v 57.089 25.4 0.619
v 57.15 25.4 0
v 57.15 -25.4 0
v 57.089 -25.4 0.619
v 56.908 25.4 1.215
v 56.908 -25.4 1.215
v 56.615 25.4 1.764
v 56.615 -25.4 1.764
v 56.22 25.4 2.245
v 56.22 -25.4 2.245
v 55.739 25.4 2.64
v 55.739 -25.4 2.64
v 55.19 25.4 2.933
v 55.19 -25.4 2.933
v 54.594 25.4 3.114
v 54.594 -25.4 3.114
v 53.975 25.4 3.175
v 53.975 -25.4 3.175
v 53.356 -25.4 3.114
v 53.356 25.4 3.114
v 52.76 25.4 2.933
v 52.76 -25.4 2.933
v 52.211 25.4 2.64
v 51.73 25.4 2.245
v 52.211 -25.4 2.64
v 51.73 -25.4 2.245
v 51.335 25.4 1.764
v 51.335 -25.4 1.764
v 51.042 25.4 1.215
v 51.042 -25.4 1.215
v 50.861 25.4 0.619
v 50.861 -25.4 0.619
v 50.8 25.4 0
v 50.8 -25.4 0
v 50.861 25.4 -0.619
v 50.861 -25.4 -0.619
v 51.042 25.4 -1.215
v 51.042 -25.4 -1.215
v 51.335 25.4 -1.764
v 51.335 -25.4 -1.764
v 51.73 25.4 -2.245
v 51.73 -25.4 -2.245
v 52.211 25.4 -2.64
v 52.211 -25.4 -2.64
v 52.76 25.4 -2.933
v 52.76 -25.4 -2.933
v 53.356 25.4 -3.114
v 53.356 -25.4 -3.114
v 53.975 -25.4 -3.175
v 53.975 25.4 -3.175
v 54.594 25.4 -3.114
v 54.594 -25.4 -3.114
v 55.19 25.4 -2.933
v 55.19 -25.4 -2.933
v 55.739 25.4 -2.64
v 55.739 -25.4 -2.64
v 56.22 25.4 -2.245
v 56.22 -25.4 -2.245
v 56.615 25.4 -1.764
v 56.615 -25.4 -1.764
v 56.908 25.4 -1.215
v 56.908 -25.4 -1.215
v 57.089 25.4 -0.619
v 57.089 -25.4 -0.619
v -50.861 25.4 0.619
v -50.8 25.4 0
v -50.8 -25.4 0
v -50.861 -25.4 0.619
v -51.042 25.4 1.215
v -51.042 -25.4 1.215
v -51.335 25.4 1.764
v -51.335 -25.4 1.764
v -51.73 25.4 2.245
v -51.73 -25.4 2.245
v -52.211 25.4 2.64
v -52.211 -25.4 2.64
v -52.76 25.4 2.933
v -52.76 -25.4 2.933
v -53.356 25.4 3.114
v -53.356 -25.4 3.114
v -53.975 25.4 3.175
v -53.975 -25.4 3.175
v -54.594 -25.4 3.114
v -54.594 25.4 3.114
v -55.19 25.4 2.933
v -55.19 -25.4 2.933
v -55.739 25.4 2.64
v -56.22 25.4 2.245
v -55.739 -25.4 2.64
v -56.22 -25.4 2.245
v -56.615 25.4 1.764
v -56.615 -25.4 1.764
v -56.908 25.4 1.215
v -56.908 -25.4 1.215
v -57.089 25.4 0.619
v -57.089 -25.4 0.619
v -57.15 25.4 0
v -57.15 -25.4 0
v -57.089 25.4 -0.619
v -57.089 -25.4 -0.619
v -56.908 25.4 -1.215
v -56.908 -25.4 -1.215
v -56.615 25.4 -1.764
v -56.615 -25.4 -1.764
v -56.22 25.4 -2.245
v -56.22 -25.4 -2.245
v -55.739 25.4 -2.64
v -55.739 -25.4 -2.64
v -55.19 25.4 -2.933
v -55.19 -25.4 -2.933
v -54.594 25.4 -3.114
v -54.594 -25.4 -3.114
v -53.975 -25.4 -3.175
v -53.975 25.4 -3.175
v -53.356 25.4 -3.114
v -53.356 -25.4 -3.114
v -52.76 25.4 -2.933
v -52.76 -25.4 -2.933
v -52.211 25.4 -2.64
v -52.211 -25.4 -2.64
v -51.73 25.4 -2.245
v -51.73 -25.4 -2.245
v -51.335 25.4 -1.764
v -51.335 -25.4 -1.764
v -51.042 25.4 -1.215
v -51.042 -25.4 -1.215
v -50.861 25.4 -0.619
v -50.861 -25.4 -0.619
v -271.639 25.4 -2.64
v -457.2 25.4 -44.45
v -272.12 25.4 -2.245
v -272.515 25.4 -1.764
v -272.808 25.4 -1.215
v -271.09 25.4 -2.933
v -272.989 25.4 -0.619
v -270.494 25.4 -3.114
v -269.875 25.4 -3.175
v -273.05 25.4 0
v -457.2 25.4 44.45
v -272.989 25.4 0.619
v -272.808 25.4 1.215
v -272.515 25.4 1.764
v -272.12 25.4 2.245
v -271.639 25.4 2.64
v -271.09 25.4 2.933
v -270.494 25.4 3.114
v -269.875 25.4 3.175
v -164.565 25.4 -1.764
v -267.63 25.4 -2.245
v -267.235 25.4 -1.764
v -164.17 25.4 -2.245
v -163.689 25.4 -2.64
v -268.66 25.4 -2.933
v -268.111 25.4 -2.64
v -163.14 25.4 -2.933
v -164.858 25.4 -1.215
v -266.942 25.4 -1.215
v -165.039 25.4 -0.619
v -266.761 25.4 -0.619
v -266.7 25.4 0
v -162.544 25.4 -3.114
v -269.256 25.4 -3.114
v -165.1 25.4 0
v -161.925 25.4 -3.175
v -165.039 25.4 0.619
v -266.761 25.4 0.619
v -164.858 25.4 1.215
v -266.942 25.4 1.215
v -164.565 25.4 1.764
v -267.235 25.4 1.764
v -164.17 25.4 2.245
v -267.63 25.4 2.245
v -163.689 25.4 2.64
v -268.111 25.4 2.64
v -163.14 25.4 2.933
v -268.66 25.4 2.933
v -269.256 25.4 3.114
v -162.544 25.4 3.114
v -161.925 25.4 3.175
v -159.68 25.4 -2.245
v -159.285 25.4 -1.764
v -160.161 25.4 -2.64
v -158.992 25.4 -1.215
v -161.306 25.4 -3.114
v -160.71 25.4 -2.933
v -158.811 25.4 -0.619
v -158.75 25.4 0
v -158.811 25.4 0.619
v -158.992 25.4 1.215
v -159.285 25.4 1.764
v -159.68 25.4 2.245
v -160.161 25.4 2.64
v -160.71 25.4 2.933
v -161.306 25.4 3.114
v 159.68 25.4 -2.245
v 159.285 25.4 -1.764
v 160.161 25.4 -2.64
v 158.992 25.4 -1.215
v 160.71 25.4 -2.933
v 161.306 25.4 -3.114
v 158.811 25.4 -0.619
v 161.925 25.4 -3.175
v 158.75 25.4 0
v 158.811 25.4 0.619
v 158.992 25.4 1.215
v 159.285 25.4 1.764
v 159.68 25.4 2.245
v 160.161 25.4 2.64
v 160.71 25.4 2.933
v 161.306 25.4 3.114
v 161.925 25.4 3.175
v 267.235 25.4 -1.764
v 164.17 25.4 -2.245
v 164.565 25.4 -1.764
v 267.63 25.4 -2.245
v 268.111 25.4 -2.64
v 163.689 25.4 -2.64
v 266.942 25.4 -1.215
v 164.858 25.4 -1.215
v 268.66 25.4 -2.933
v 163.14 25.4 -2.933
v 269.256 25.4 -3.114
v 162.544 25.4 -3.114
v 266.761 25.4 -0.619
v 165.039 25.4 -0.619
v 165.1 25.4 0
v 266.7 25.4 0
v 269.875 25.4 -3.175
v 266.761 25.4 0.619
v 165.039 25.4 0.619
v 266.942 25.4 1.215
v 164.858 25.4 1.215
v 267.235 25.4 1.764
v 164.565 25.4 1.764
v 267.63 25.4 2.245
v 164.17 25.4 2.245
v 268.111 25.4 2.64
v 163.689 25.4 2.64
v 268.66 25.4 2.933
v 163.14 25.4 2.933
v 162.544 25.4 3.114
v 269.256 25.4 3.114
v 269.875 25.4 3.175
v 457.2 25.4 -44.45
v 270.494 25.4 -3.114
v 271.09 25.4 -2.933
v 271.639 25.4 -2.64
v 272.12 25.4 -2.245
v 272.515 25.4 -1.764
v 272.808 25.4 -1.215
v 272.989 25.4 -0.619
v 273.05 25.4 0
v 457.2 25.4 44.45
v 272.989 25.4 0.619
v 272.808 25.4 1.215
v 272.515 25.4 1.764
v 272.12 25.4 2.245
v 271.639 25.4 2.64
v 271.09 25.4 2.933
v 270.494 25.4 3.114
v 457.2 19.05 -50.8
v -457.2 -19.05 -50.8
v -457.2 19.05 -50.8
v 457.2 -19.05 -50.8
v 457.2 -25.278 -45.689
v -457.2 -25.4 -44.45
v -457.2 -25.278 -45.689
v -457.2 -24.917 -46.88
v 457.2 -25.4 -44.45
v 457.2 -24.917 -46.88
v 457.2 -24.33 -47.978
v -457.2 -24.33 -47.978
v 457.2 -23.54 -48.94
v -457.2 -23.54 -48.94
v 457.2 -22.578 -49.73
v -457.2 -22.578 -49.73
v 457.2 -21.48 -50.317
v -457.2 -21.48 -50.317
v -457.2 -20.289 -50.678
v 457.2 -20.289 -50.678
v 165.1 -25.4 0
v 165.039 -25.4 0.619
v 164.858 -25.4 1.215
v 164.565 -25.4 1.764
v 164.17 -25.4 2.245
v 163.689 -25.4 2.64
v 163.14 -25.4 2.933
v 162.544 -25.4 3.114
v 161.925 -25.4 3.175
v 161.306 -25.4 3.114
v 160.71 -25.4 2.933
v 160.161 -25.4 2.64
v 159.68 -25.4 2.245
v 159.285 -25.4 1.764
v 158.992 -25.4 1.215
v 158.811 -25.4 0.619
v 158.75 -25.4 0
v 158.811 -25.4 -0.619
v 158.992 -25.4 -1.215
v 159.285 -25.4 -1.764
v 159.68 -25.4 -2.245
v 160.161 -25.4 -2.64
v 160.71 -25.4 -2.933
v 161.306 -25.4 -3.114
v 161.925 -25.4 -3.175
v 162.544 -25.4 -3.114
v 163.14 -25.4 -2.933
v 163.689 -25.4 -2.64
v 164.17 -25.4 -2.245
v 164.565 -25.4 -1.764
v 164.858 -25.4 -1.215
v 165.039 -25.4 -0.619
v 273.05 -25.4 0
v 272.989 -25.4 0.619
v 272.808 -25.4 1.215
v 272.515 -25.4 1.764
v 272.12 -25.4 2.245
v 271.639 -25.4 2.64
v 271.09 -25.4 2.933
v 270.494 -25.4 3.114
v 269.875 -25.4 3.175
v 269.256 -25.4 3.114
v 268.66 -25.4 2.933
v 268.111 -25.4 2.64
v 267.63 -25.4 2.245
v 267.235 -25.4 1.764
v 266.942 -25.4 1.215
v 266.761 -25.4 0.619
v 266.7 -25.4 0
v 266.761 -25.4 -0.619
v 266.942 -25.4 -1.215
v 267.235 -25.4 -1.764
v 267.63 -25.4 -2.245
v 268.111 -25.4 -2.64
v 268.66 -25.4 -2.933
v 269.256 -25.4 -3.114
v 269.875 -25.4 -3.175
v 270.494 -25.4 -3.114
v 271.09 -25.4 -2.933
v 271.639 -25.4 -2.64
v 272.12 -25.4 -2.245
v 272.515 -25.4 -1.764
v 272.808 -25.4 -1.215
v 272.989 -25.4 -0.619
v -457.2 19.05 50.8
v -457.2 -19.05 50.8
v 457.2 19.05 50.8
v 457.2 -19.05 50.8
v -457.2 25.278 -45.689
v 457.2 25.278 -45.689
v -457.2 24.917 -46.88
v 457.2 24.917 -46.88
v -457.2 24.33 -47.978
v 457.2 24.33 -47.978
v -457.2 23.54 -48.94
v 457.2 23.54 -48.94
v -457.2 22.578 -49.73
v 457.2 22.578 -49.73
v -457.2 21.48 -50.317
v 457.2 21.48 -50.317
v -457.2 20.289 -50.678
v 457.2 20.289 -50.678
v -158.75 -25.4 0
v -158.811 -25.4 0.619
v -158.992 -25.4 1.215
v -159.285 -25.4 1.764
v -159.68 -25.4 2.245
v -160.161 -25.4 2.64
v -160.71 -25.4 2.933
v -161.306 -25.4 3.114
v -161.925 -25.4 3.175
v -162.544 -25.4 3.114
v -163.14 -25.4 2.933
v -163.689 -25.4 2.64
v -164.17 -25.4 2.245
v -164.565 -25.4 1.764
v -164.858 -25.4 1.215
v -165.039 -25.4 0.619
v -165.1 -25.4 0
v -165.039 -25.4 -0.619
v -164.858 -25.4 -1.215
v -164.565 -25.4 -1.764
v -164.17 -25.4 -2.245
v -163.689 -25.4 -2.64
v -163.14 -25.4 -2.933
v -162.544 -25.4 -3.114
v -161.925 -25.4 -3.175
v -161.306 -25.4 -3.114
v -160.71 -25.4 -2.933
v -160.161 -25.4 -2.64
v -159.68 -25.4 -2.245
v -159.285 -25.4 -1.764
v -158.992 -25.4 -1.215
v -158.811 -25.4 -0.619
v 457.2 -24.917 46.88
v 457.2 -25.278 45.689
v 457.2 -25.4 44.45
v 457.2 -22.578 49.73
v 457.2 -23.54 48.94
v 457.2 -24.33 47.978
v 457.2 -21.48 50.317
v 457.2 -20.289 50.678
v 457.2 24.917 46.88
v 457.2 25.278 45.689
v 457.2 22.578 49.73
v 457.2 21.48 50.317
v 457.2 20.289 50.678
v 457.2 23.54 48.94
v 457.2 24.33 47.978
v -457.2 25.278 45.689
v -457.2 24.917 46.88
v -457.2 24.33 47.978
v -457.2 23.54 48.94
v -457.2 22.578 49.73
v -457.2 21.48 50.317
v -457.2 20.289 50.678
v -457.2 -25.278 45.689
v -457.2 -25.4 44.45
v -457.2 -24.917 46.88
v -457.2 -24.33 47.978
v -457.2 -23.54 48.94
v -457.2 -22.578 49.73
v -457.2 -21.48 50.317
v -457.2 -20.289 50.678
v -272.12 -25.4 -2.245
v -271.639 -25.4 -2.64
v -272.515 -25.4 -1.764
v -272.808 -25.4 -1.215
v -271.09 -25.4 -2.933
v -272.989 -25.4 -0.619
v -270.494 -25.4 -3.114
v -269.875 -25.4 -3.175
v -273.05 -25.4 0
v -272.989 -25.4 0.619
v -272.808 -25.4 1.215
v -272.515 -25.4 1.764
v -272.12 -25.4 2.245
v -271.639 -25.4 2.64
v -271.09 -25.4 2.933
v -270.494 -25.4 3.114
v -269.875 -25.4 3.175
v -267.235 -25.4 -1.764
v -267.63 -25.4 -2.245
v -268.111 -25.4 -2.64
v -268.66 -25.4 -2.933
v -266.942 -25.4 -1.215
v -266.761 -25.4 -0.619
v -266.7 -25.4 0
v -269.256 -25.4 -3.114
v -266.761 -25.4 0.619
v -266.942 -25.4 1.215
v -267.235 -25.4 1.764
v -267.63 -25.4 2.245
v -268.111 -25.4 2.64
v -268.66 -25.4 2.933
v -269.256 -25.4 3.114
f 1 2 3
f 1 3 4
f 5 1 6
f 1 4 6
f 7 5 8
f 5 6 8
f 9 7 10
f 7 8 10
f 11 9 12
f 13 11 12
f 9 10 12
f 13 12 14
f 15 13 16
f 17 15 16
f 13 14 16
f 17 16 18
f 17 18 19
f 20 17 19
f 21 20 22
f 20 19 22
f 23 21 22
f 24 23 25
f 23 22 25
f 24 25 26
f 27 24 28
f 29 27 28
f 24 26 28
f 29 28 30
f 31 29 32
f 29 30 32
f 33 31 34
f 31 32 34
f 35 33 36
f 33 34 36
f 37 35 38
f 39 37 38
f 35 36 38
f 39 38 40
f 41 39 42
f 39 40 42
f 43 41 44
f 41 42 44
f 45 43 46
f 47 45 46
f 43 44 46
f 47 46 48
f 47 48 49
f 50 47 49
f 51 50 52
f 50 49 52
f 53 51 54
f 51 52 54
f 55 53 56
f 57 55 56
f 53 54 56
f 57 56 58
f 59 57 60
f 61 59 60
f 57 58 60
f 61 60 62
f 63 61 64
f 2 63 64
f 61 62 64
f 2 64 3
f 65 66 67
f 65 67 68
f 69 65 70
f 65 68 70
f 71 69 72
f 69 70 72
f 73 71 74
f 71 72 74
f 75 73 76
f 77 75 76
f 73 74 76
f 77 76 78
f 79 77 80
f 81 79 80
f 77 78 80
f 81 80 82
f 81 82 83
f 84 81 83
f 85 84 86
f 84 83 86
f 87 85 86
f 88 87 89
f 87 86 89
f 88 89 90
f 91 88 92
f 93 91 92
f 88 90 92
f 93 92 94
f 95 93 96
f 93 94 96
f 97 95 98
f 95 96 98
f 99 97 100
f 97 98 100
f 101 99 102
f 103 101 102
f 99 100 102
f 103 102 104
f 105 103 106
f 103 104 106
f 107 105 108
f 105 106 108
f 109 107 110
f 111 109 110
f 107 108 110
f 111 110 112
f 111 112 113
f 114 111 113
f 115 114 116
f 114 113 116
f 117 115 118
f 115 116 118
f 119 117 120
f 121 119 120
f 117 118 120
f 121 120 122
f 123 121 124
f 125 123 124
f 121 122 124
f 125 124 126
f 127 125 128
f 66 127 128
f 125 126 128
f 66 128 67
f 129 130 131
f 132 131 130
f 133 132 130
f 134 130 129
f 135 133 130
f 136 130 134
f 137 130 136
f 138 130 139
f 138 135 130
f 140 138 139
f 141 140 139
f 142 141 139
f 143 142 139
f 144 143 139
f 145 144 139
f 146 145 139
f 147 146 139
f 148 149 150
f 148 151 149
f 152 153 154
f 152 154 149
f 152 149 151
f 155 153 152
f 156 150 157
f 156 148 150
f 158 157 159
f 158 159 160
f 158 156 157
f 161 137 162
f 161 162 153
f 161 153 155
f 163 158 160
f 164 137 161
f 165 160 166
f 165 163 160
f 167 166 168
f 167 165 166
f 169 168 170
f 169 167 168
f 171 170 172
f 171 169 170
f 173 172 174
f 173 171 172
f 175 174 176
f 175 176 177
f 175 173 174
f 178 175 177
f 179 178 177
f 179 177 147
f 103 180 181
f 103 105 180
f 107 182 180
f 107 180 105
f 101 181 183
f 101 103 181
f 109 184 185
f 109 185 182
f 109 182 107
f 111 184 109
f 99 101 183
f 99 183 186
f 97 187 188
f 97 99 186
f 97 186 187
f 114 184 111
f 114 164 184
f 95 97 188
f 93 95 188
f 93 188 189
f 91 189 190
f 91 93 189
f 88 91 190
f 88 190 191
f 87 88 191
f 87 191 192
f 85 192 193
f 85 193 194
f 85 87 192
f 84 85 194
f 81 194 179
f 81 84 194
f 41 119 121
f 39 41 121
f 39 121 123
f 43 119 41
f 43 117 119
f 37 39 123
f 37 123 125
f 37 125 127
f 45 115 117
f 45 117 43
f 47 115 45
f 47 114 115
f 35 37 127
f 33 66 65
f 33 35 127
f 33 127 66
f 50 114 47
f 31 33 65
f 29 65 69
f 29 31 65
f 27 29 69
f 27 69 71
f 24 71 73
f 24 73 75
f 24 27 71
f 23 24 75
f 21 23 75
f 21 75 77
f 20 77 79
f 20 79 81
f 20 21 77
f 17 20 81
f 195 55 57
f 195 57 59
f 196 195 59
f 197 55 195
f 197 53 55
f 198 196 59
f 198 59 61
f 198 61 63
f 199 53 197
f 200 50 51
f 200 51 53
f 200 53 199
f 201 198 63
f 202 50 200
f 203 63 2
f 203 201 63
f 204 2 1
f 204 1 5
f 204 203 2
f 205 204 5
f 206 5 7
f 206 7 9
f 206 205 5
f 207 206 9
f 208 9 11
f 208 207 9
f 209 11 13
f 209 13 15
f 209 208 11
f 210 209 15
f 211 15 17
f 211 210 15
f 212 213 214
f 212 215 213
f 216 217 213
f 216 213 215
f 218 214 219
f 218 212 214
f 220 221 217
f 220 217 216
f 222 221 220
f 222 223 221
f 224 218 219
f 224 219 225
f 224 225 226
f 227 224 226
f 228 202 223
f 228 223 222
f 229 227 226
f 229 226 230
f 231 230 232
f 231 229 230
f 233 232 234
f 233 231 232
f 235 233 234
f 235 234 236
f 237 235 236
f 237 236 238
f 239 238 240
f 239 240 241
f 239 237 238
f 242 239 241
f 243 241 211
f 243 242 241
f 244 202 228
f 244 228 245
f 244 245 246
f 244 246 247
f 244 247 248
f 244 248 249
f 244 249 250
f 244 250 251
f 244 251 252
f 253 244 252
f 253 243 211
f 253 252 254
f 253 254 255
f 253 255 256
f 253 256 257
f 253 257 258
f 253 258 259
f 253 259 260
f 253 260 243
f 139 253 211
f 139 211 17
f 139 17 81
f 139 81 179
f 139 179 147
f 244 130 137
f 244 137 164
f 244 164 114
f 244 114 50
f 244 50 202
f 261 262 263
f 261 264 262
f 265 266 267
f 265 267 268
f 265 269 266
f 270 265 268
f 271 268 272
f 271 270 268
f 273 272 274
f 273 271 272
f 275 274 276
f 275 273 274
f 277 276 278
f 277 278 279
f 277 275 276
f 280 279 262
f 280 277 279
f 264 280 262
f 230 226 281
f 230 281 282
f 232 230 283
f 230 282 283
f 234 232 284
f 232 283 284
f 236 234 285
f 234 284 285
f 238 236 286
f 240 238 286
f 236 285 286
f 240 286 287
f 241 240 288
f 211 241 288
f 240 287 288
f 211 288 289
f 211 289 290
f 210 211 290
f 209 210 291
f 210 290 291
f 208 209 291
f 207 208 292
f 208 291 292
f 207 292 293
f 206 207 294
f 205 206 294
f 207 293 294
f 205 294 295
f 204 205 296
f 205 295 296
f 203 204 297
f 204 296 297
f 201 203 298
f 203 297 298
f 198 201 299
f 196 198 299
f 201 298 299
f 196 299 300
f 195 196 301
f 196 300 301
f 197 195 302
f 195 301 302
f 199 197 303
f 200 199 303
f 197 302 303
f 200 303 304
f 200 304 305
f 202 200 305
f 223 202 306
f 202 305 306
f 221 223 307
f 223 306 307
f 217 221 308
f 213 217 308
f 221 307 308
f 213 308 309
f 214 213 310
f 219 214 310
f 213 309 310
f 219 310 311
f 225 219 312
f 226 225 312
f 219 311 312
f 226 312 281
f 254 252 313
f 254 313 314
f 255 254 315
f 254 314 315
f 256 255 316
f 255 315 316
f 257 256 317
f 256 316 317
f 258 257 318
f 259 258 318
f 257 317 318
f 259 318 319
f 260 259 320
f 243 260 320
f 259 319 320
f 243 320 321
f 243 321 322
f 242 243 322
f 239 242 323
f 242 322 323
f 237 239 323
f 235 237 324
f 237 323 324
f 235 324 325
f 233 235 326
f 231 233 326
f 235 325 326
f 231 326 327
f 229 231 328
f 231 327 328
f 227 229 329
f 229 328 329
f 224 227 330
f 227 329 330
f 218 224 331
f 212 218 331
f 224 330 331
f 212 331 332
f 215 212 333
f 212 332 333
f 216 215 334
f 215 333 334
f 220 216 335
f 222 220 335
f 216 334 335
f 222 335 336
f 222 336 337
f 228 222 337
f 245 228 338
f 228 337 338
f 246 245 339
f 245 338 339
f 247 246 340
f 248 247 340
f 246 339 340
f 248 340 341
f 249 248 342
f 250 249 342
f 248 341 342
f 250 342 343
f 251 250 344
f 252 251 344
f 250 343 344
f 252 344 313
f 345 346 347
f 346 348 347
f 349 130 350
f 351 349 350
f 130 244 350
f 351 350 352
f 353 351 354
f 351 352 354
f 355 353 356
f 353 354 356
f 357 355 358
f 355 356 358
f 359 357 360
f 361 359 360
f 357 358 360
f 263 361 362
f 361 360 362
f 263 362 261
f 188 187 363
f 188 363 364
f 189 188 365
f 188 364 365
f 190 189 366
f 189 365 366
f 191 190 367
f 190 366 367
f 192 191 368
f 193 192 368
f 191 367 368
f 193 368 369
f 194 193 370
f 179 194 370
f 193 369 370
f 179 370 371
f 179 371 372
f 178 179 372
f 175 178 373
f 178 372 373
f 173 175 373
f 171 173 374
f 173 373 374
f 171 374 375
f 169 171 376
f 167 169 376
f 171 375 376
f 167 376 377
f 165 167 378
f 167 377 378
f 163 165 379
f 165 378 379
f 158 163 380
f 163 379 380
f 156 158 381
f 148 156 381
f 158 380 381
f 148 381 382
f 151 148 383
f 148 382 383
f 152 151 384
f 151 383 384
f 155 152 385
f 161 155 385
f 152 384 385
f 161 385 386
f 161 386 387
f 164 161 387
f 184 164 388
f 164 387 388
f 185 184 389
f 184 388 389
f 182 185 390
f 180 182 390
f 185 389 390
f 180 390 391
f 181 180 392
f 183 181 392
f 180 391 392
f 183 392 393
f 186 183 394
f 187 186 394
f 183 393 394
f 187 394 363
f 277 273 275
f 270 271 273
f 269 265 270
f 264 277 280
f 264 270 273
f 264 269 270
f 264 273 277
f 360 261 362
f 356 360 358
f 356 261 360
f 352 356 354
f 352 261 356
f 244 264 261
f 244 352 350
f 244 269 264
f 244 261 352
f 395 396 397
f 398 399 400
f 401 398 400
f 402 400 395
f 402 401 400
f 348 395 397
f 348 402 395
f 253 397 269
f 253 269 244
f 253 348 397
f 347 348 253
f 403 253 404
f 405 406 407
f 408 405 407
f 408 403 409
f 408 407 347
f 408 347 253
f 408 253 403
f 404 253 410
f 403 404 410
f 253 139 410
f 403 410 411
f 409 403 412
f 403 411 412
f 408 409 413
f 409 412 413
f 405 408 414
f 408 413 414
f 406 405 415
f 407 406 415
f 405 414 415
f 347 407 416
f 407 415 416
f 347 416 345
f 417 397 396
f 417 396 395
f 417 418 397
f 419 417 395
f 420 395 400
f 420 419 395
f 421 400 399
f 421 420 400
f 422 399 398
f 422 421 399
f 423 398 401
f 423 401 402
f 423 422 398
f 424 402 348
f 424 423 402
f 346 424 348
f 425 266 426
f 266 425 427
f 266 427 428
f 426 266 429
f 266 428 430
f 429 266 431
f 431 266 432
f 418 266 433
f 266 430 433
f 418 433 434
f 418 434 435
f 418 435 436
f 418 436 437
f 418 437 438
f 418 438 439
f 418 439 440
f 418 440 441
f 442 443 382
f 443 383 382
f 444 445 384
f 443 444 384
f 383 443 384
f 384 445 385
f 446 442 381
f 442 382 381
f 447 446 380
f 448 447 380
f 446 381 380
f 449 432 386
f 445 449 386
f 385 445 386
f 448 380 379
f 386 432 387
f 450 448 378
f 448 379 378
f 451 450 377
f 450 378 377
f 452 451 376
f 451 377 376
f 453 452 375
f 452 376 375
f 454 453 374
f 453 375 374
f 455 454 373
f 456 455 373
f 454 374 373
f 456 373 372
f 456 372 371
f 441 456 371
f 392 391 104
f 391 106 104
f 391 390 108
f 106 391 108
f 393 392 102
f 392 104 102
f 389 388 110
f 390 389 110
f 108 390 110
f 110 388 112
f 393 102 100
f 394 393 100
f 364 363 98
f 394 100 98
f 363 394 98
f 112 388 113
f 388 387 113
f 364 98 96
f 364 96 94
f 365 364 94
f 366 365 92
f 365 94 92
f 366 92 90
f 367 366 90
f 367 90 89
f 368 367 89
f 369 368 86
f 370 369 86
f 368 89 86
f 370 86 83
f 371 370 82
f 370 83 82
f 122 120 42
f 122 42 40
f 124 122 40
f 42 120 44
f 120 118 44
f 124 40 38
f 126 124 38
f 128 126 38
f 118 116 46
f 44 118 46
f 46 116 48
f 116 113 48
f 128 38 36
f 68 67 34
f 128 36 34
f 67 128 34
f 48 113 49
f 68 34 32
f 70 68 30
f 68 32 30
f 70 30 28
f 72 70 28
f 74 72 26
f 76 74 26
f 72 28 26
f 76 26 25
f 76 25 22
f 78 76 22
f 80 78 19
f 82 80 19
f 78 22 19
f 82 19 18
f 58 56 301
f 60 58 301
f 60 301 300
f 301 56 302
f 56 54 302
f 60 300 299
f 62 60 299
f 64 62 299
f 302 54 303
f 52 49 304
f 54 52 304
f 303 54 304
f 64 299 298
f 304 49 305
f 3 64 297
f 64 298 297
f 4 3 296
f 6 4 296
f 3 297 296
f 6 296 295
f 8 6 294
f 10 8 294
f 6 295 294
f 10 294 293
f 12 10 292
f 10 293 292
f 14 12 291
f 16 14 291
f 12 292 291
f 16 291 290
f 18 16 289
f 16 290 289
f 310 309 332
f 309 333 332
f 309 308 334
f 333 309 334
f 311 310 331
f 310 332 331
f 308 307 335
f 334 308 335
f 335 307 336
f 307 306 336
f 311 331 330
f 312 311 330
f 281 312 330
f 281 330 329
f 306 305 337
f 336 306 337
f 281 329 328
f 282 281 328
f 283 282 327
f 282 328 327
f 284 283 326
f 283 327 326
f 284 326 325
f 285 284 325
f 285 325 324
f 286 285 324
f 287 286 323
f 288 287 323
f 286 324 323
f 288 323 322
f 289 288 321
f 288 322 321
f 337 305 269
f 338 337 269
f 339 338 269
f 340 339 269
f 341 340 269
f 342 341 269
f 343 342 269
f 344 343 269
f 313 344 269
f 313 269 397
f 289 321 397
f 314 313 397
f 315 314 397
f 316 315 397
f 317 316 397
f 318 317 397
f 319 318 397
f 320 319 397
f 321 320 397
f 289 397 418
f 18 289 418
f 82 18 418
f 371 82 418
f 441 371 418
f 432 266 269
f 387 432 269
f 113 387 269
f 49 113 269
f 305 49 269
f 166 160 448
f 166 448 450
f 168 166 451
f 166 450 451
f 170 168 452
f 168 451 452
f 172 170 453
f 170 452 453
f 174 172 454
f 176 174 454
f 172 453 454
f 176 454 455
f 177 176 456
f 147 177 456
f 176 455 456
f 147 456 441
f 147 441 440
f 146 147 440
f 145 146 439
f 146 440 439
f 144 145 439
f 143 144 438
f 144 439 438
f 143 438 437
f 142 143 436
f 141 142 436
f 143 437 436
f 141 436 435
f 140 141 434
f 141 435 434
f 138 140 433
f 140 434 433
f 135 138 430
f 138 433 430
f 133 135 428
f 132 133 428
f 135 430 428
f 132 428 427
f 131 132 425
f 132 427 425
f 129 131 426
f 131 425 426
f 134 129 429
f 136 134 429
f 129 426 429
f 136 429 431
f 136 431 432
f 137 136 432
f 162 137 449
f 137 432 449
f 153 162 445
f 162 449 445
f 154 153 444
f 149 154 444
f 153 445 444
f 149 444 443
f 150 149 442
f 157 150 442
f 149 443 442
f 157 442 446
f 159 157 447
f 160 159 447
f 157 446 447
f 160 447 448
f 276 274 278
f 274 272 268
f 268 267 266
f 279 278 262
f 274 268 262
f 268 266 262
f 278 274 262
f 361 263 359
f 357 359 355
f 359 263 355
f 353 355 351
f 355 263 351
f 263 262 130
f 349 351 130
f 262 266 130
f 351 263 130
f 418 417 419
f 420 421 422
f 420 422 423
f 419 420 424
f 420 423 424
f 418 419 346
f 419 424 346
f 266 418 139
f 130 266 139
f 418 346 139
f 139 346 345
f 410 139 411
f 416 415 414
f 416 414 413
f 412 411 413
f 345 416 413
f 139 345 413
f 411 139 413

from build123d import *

# Parameters (mm, degrees)
F0_W     = 50.8
F0_H     = 101.6
F1_DEPTH = 457.2
F2_R     = 6.35
F3_R     = 3.175
F4_DEPTH = 50.8


with BuildPart() as f1:
    # F0 (on Right) → F1 (new body, symmetric)
    with BuildSketch(Plane.YZ):
        Rectangle(F0_W, F0_H)
    extrude(amount=F1_DEPTH, both=True)

    # F2
    f2_edges = [f1.edges().sort_by_distance(p)[0] for p in [
        (0, -25.4, -50.8),
        (0, 25.4, -50.8),
        (0, -25.4, 50.8),
        (0, 25.4, 50.8),
    ]]
    fillet(f2_edges, radius=F2_R)

    # F3 (on face) → F4 (cut, through all)
    with BuildSketch(Plane.XZ.offset(25.4)):
        with Locations((-269.875, 0)):
            Circle(F3_R)
        with Locations((-161.925, 0)):
            Circle(F3_R)
        with Locations((-53.975, 0)):
            Circle(F3_R)
        with Locations((53.975, 0)):
            Circle(F3_R)
        with Locations((161.925, 0)):
            Circle(F3_R)
        with Locations((269.875, 0)):
            Circle(F3_R)
    extrude(amount=-F4_DEPTH, mode=Mode.SUBTRACT)


solid = f1.part
